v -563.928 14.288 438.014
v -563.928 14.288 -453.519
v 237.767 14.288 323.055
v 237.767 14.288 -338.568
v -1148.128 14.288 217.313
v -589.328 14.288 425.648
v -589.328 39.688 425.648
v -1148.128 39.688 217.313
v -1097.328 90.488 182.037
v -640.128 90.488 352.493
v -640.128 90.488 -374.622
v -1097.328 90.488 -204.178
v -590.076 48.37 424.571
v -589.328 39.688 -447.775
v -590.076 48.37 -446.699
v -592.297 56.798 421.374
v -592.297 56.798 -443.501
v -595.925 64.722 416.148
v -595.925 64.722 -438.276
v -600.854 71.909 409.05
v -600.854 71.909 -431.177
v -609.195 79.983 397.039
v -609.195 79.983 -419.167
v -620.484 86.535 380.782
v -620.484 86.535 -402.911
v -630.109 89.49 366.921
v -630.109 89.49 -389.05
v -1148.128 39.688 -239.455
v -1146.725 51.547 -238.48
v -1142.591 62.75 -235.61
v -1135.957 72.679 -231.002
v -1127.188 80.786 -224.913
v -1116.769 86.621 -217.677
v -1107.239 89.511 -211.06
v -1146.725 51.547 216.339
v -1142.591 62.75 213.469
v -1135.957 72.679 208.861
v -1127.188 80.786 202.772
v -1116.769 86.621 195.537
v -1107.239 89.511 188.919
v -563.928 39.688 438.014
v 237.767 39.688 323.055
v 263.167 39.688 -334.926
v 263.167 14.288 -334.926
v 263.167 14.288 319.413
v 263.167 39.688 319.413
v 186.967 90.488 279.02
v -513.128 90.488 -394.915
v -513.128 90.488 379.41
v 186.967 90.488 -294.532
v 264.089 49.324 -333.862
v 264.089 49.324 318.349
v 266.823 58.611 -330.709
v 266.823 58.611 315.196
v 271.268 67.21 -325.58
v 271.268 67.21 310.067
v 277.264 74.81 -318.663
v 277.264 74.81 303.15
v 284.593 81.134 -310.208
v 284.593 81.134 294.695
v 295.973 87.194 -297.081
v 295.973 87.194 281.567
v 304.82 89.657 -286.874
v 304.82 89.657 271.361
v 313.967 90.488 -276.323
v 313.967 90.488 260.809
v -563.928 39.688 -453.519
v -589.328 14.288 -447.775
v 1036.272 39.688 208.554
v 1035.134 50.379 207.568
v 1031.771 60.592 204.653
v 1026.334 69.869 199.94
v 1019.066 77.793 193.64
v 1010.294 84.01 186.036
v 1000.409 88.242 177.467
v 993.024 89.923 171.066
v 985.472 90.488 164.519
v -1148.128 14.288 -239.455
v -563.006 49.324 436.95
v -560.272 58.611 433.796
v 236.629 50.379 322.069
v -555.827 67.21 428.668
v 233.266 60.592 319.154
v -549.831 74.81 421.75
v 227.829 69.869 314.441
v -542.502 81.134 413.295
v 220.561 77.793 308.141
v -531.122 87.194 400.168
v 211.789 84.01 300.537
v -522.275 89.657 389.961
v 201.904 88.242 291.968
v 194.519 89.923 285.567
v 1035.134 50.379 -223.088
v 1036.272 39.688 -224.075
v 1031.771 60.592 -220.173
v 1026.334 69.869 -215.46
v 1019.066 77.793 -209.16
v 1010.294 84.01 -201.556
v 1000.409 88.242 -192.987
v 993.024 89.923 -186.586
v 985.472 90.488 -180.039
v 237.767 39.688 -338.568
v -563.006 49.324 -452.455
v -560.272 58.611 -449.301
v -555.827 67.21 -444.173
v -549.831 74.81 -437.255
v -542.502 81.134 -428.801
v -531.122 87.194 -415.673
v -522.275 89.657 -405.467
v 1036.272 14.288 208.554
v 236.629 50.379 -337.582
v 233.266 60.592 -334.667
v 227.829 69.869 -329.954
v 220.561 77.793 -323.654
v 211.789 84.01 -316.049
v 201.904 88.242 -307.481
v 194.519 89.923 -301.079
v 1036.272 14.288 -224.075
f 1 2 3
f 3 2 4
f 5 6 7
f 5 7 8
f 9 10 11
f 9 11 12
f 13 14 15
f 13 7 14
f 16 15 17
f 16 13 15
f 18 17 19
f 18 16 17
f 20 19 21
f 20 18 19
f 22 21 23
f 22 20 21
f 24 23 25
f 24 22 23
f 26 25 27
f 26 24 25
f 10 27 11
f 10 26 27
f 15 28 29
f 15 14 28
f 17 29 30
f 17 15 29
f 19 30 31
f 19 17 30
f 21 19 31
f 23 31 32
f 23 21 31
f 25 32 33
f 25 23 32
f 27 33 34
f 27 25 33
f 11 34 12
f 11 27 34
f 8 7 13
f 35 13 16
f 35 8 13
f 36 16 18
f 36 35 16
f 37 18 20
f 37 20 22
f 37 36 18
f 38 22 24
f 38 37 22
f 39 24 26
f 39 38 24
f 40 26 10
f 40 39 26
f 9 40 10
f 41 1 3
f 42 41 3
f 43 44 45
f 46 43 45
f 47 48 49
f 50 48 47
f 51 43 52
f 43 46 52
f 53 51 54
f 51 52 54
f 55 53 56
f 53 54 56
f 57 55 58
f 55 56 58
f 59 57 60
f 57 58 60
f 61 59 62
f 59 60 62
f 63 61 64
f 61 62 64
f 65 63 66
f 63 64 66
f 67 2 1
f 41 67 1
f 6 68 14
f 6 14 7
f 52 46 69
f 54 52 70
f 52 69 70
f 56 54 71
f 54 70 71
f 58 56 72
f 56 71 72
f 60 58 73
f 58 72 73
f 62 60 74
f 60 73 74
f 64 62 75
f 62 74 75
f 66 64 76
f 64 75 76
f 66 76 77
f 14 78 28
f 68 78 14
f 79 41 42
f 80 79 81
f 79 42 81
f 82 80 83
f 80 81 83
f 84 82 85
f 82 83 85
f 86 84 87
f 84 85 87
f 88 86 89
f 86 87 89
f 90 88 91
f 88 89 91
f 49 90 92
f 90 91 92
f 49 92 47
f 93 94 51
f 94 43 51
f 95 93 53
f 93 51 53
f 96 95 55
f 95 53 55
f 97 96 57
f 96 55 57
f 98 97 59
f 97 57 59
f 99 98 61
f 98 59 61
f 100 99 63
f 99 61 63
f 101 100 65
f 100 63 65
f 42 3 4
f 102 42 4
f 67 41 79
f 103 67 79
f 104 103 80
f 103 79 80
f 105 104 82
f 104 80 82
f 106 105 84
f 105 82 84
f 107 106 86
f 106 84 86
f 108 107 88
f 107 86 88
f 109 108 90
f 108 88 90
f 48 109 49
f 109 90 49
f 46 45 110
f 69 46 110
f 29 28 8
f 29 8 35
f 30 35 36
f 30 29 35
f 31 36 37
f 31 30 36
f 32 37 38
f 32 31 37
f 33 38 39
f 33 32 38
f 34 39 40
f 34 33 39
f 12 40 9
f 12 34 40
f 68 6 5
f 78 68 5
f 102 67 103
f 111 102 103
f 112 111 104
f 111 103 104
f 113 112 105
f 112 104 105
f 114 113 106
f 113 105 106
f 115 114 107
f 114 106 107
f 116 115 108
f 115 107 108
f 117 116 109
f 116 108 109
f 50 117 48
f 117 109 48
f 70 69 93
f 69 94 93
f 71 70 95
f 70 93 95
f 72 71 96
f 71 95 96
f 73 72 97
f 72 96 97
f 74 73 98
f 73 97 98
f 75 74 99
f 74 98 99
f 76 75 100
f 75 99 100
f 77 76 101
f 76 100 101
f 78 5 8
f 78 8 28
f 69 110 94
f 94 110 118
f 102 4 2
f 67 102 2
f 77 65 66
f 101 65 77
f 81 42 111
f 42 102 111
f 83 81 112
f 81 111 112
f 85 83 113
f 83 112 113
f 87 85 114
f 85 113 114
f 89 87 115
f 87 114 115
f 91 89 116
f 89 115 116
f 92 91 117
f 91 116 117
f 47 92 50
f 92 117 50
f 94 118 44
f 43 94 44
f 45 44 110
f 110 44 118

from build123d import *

# Parameters (mm, degrees)
BOSS_EXTRUDE3_DEPTH = 76.2
BOSS_EXTRUDE4_DEPTH = 76.2
BOSS_EXTRUDE5_DEPTH = 76.2
FILLET2_R           = 50.8
FILLET3_R           = 50.8
FILLET4_R           = 50.8


with BuildPart() as part:
    # Sketch2 → Boss-Extrude3 (new body)
    with BuildSketch(Plane(origin=(0, 14.2875, 0), x_dir=(1, 0, 0), z_dir=(0, 1, 0))):
        Polygon((-1148.128331341, 239.454600148), (-589.328331341, 447.775240148), (-589.328331341, -425.648013671), (-1148.128331341, -217.313403671), align=None)
    extrude(amount=BOSS_EXTRUDE3_DEPTH)

    # Fillet2
    fillet2_edges = [part.edges().sort_by_distance(p)[0] for p in [
        (-589.328331341, 90.4875, -11.063613239),
        (-868.728331341, 90.4875, -343.614920148),
        (-1148.128331341, 90.4875, -11.070598239),
        (-868.728331341, 90.4875, 321.480708671),
    ]]
    fillet(fillet2_edges, radius=FILLET2_R)


with BuildPart() as body_2:
    # Sketch3 → Boss-Extrude4 (new body)
    with BuildSketch(Plane(origin=(0, 14.2875, 0), x_dir=(1, 0, 0), z_dir=(0, 1, 0))):
        Polygon((-563.928331341, 453.518833879), (-563.928331341, -438.013880611), (237.766686559, -323.055440208), (237.766686559, 338.568102081), align=None)
    extrude(amount=BOSS_EXTRUDE4_DEPTH)

    # Fillet3
    fillet3_edges = [body_2.edges().sort_by_distance(p)[0] for p in [
        (-163.080822391, 90.4875, 380.53466041),
        (237.766686559, 90.4875, -7.756330937),
        (-163.080822391, 90.4875, -396.04346798),
        (-563.928331341, 90.4875, -7.752476634),
    ]]
    fillet(fillet3_edges, radius=FILLET3_R)


with BuildPart() as body_3:
    # Sketch4 → Boss-Extrude5 (new body)
    with BuildSketch(Plane(origin=(0, 14.2875, 0), x_dir=(1, 0, 0), z_dir=(0, 1, 0))):
        Polygon((263.166686559, 334.92613285), (263.166686559, -319.413226747), (1036.271668659, -208.554432534), (1036.271668659, 224.07477234), align=None)
    extrude(amount=BOSS_EXTRUDE5_DEPTH)

    # Fillet4
    fillet4_edges = [body_3.edges().sort_by_distance(p)[0] for p in [
        (649.719177609, 90.4875, 263.983829641),
        (1036.271668659, 90.4875, -7.760169903),
        (649.719177609, 90.4875, -279.500452595),
        (263.166686559, 90.4875, -7.756453052),
    ]]
    fillet(fillet4_edges, radius=FILLET4_R)


solid = Compound([part.part, body_2.part, body_3.part])
